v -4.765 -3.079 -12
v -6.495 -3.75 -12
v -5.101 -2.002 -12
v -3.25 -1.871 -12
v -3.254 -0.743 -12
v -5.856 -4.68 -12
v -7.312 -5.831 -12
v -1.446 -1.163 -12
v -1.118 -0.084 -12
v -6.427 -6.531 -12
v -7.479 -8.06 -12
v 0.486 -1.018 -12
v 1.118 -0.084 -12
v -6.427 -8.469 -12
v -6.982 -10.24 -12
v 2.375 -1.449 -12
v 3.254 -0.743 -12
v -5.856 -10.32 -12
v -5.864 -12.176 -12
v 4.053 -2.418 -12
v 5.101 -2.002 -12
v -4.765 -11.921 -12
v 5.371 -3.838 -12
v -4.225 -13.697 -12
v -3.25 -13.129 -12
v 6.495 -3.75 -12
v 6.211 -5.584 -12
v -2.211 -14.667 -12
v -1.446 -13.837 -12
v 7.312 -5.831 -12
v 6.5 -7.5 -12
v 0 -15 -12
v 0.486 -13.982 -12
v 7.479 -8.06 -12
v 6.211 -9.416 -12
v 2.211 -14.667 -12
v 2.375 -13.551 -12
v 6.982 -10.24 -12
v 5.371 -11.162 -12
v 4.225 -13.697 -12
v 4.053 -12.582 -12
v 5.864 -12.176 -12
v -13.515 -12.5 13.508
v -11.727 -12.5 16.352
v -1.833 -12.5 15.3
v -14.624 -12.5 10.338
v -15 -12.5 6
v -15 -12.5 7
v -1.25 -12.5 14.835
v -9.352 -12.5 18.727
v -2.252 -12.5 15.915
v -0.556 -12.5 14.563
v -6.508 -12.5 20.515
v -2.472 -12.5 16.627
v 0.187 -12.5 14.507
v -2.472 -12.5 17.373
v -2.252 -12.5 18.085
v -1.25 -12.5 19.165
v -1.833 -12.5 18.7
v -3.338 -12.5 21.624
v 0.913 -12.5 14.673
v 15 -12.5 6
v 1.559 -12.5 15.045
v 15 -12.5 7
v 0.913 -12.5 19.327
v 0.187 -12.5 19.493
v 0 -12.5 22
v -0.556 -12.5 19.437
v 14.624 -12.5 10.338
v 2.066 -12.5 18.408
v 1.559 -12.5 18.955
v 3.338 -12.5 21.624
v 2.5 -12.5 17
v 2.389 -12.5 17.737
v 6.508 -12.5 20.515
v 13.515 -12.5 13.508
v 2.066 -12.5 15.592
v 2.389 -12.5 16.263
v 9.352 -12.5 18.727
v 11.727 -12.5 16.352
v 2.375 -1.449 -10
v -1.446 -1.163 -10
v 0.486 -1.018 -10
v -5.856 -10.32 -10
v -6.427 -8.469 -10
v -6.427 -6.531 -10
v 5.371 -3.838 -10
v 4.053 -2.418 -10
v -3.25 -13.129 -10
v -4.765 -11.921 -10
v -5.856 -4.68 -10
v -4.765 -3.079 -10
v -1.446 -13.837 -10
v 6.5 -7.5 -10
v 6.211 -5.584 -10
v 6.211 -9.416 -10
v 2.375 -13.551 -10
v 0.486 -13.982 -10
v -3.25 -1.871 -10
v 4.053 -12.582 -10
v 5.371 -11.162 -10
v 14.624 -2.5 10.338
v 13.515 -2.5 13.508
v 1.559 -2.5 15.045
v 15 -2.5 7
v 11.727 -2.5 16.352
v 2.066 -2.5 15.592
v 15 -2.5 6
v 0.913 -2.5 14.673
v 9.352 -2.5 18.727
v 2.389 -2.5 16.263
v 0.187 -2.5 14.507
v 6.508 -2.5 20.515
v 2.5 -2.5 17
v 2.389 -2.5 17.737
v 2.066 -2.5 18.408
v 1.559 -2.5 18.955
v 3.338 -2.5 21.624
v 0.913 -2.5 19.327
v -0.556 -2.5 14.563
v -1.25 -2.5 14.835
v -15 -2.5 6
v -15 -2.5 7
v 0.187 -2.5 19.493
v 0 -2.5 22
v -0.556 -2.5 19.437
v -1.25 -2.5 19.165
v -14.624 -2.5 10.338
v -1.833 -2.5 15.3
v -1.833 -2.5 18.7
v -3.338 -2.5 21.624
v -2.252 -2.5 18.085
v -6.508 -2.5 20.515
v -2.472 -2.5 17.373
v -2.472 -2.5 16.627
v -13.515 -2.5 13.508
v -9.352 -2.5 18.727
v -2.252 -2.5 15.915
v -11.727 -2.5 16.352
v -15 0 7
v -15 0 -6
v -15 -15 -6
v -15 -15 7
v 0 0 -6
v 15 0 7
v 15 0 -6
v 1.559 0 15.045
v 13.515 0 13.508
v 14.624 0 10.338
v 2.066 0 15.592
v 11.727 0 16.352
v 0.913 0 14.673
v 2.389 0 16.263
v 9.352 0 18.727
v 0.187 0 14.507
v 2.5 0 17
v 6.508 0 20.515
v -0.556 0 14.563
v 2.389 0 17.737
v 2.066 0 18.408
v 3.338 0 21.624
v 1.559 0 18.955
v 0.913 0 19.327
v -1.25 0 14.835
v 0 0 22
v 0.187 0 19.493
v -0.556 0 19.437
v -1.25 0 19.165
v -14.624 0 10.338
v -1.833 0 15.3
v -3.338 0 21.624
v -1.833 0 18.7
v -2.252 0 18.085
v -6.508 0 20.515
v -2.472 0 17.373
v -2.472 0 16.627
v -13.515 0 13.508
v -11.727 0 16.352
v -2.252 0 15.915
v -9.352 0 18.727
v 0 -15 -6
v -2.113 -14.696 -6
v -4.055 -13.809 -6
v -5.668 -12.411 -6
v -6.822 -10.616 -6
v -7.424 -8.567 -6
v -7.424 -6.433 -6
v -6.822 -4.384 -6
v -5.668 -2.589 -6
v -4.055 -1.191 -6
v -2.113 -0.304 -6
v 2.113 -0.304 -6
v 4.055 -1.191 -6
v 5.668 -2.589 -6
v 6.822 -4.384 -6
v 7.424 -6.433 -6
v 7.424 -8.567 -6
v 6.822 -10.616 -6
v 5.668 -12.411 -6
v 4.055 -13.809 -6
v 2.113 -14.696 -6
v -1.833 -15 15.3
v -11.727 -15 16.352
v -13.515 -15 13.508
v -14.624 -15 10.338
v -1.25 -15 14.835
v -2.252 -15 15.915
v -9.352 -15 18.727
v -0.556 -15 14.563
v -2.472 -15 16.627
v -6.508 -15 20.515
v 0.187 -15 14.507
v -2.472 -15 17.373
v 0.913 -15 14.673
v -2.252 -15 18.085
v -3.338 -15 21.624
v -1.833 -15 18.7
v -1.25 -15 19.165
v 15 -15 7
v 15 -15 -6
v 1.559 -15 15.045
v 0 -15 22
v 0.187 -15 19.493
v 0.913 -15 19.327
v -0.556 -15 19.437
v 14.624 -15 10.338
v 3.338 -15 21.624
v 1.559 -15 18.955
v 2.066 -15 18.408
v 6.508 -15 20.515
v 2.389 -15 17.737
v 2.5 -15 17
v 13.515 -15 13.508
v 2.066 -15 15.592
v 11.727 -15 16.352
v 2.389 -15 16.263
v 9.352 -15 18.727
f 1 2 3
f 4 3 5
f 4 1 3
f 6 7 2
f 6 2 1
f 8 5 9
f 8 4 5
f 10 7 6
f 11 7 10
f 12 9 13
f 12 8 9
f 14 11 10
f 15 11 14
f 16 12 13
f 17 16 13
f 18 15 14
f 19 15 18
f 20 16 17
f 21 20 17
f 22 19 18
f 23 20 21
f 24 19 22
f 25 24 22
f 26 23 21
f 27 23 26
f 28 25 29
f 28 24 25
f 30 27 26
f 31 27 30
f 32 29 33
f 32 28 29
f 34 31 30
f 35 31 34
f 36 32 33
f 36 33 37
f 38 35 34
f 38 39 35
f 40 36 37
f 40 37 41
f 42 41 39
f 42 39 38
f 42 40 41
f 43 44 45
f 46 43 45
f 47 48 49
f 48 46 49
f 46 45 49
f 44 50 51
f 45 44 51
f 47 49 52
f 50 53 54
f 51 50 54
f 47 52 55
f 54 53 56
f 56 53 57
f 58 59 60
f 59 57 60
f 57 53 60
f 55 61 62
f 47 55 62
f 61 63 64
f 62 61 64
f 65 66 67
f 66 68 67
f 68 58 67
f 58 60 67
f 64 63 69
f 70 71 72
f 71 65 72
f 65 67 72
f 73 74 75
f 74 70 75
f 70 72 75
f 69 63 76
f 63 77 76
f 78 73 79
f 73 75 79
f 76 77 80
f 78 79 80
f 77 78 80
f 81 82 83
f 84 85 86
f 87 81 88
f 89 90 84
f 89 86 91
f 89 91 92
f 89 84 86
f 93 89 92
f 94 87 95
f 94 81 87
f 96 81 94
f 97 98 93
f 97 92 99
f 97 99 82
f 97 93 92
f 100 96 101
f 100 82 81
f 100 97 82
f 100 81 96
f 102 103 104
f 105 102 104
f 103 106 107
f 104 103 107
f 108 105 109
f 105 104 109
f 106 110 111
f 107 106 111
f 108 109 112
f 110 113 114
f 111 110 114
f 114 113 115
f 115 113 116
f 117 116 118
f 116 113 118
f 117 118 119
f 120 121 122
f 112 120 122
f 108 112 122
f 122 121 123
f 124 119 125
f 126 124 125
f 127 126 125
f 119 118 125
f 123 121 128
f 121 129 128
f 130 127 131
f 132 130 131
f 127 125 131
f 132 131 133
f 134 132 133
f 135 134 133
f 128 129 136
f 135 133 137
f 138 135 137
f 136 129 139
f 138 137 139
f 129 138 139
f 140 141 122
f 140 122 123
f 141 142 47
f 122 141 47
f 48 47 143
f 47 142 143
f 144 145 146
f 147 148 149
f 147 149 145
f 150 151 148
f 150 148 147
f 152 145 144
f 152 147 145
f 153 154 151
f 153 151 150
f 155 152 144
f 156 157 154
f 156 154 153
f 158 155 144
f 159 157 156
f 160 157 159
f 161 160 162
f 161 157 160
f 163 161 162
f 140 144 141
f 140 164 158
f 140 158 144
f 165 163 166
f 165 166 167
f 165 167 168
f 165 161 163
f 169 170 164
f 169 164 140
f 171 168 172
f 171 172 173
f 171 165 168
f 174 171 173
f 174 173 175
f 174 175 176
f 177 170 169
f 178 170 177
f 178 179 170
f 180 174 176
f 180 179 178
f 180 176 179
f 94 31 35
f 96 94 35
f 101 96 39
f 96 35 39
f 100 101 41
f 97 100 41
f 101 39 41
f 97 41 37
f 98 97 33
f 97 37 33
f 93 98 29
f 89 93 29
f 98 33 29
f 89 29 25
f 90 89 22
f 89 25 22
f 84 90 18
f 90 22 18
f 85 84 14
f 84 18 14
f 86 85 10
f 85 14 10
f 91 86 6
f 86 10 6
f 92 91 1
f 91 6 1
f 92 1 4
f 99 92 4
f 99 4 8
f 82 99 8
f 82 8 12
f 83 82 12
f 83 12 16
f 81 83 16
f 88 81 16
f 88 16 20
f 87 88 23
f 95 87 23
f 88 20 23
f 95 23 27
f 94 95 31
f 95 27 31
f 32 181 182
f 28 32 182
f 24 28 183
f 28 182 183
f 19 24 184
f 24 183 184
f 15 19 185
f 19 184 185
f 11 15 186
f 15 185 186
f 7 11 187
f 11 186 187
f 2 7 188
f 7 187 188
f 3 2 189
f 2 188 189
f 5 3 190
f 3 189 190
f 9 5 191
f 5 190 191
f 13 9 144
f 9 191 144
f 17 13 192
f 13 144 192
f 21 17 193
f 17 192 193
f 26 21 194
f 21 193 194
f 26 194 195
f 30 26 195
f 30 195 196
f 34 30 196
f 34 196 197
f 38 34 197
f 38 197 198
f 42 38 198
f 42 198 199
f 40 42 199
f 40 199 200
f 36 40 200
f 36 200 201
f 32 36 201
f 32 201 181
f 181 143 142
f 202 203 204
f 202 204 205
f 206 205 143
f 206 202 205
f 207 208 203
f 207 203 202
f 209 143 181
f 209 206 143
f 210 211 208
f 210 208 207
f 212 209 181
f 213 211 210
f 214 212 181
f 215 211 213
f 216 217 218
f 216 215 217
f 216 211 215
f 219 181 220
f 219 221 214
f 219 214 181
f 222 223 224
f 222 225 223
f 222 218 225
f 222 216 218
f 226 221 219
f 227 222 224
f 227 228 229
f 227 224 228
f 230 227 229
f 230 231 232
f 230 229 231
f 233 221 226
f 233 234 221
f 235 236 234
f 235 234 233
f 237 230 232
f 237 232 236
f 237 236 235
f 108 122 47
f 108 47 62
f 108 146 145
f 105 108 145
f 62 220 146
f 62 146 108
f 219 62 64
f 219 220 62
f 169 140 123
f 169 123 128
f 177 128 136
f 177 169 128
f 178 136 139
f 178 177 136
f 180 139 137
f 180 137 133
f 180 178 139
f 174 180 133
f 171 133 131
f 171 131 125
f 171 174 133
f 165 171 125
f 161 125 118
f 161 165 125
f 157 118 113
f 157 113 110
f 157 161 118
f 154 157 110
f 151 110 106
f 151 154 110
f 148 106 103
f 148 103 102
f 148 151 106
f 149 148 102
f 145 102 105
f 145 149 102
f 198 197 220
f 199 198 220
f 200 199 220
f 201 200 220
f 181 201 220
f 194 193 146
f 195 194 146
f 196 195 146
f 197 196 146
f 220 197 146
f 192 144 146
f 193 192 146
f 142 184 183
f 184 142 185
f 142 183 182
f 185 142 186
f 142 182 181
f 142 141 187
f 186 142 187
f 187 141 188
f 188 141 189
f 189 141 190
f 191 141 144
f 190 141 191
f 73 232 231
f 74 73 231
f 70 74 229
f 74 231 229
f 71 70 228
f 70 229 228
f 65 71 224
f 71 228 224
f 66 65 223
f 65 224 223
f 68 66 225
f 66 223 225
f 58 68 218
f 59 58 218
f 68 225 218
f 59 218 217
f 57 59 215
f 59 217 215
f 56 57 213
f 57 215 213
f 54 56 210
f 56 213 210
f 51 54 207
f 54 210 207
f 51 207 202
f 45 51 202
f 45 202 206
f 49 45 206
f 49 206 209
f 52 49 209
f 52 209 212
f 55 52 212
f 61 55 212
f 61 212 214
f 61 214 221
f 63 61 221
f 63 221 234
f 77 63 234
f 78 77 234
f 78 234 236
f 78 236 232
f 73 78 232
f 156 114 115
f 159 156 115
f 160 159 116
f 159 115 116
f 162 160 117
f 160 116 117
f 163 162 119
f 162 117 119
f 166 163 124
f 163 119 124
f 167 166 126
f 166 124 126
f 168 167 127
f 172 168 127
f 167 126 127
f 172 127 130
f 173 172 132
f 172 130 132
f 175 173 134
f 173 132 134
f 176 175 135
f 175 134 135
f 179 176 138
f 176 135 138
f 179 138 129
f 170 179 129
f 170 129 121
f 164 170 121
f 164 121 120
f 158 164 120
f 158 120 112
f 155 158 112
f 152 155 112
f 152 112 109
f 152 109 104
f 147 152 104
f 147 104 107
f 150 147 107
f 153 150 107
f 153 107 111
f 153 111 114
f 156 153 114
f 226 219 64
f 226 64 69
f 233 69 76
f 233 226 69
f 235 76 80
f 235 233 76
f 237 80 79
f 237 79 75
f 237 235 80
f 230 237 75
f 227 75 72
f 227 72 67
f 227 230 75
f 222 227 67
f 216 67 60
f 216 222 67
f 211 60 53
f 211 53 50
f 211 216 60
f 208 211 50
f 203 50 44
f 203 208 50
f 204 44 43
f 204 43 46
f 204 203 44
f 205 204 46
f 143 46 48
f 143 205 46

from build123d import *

# Parameters (mm, degrees)
F0_W      = 30
F0_H      = 12
F1_DEPTH  = 15
F2_W      = 30
F2_H      = 1
F3_DEPTH  = 2.5
F4_W      = 30
F4_H      = 1
F5_DEPTH  = 2.5
F6_R      = 2.5
F7_DEPTH  = 15.001
F9_DEPTH  = 6
F10_R     = 6.5
F11_DEPTH = 2


# Not quite as in the source:
# - a feature names something its author has since deleted; it is built from what else it names


with BuildPart() as f1:
    # F0 (on Front) → F1 (new body)
    with BuildSketch(Plane.XZ):
        Rectangle(F0_W, F0_H)
    extrude(amount=F1_DEPTH)

    # F2 (on face) → F3 (join)
    with BuildSketch(Plane(origin=(0, 0, 0), x_dir=(-1, 0, 0), z_dir=(0, 1, 0))):
        with Locations((0, 6.5)):
            Rectangle(F2_W, F2_H)
        with BuildLine():
            ThreePointArc((15, 7), (0, 22), (-15, 7))
            Line((-15, 7), (15, 7))
        make_face()
    extrude(amount=-F3_DEPTH)

    # F4 (on face) → F5 (join)
    with BuildSketch(Plane.XZ.offset(15)):
        with Locations((0, 6.5)):
            Rectangle(F4_W, F4_H)
        with BuildLine():
            ThreePointArc((15, 7), (0, 22), (-15, 7))
            Line((-15, 7), (15, 7))
        make_face()
    extrude(amount=-F5_DEPTH)

    # F6 (on face) → F7 (cut, through all)
    with BuildSketch(Plane.XZ.offset(15)):
        with Locations((-1.01e-08, 17)):
            Circle(F6_R)
    extrude(amount=-F7_DEPTH, mode=Mode.SUBTRACT)

    # F8 (on face) → F9 (join)
    with BuildSketch(Plane(origin=(0, 0, -6), x_dir=(1, 0, 0), z_dir=(0, 0, -1))):
        with BuildLine():
            ThreePointArc((0, 0), (5.3033008589, 2.1966991411), (7.5, 7.5))
            ThreePointArc((7.5, 7.5), (5.3033008589, 12.8033008589), (0, 15))
            ThreePointArc((0, 15), (-7.5, 7.5), (0, 0))
        make_face()
    extrude(amount=F9_DEPTH)

    # F10 (on face) → F11 (cut)
    with BuildSketch(Plane(origin=(0, 0, -12), x_dir=(1, 0, 0), z_dir=(0, 0, -1))):
        with Locations((0, 7.5)):
            Circle(F10_R)
    extrude(amount=-F11_DEPTH, mode=Mode.SUBTRACT)


solid = f1.part
